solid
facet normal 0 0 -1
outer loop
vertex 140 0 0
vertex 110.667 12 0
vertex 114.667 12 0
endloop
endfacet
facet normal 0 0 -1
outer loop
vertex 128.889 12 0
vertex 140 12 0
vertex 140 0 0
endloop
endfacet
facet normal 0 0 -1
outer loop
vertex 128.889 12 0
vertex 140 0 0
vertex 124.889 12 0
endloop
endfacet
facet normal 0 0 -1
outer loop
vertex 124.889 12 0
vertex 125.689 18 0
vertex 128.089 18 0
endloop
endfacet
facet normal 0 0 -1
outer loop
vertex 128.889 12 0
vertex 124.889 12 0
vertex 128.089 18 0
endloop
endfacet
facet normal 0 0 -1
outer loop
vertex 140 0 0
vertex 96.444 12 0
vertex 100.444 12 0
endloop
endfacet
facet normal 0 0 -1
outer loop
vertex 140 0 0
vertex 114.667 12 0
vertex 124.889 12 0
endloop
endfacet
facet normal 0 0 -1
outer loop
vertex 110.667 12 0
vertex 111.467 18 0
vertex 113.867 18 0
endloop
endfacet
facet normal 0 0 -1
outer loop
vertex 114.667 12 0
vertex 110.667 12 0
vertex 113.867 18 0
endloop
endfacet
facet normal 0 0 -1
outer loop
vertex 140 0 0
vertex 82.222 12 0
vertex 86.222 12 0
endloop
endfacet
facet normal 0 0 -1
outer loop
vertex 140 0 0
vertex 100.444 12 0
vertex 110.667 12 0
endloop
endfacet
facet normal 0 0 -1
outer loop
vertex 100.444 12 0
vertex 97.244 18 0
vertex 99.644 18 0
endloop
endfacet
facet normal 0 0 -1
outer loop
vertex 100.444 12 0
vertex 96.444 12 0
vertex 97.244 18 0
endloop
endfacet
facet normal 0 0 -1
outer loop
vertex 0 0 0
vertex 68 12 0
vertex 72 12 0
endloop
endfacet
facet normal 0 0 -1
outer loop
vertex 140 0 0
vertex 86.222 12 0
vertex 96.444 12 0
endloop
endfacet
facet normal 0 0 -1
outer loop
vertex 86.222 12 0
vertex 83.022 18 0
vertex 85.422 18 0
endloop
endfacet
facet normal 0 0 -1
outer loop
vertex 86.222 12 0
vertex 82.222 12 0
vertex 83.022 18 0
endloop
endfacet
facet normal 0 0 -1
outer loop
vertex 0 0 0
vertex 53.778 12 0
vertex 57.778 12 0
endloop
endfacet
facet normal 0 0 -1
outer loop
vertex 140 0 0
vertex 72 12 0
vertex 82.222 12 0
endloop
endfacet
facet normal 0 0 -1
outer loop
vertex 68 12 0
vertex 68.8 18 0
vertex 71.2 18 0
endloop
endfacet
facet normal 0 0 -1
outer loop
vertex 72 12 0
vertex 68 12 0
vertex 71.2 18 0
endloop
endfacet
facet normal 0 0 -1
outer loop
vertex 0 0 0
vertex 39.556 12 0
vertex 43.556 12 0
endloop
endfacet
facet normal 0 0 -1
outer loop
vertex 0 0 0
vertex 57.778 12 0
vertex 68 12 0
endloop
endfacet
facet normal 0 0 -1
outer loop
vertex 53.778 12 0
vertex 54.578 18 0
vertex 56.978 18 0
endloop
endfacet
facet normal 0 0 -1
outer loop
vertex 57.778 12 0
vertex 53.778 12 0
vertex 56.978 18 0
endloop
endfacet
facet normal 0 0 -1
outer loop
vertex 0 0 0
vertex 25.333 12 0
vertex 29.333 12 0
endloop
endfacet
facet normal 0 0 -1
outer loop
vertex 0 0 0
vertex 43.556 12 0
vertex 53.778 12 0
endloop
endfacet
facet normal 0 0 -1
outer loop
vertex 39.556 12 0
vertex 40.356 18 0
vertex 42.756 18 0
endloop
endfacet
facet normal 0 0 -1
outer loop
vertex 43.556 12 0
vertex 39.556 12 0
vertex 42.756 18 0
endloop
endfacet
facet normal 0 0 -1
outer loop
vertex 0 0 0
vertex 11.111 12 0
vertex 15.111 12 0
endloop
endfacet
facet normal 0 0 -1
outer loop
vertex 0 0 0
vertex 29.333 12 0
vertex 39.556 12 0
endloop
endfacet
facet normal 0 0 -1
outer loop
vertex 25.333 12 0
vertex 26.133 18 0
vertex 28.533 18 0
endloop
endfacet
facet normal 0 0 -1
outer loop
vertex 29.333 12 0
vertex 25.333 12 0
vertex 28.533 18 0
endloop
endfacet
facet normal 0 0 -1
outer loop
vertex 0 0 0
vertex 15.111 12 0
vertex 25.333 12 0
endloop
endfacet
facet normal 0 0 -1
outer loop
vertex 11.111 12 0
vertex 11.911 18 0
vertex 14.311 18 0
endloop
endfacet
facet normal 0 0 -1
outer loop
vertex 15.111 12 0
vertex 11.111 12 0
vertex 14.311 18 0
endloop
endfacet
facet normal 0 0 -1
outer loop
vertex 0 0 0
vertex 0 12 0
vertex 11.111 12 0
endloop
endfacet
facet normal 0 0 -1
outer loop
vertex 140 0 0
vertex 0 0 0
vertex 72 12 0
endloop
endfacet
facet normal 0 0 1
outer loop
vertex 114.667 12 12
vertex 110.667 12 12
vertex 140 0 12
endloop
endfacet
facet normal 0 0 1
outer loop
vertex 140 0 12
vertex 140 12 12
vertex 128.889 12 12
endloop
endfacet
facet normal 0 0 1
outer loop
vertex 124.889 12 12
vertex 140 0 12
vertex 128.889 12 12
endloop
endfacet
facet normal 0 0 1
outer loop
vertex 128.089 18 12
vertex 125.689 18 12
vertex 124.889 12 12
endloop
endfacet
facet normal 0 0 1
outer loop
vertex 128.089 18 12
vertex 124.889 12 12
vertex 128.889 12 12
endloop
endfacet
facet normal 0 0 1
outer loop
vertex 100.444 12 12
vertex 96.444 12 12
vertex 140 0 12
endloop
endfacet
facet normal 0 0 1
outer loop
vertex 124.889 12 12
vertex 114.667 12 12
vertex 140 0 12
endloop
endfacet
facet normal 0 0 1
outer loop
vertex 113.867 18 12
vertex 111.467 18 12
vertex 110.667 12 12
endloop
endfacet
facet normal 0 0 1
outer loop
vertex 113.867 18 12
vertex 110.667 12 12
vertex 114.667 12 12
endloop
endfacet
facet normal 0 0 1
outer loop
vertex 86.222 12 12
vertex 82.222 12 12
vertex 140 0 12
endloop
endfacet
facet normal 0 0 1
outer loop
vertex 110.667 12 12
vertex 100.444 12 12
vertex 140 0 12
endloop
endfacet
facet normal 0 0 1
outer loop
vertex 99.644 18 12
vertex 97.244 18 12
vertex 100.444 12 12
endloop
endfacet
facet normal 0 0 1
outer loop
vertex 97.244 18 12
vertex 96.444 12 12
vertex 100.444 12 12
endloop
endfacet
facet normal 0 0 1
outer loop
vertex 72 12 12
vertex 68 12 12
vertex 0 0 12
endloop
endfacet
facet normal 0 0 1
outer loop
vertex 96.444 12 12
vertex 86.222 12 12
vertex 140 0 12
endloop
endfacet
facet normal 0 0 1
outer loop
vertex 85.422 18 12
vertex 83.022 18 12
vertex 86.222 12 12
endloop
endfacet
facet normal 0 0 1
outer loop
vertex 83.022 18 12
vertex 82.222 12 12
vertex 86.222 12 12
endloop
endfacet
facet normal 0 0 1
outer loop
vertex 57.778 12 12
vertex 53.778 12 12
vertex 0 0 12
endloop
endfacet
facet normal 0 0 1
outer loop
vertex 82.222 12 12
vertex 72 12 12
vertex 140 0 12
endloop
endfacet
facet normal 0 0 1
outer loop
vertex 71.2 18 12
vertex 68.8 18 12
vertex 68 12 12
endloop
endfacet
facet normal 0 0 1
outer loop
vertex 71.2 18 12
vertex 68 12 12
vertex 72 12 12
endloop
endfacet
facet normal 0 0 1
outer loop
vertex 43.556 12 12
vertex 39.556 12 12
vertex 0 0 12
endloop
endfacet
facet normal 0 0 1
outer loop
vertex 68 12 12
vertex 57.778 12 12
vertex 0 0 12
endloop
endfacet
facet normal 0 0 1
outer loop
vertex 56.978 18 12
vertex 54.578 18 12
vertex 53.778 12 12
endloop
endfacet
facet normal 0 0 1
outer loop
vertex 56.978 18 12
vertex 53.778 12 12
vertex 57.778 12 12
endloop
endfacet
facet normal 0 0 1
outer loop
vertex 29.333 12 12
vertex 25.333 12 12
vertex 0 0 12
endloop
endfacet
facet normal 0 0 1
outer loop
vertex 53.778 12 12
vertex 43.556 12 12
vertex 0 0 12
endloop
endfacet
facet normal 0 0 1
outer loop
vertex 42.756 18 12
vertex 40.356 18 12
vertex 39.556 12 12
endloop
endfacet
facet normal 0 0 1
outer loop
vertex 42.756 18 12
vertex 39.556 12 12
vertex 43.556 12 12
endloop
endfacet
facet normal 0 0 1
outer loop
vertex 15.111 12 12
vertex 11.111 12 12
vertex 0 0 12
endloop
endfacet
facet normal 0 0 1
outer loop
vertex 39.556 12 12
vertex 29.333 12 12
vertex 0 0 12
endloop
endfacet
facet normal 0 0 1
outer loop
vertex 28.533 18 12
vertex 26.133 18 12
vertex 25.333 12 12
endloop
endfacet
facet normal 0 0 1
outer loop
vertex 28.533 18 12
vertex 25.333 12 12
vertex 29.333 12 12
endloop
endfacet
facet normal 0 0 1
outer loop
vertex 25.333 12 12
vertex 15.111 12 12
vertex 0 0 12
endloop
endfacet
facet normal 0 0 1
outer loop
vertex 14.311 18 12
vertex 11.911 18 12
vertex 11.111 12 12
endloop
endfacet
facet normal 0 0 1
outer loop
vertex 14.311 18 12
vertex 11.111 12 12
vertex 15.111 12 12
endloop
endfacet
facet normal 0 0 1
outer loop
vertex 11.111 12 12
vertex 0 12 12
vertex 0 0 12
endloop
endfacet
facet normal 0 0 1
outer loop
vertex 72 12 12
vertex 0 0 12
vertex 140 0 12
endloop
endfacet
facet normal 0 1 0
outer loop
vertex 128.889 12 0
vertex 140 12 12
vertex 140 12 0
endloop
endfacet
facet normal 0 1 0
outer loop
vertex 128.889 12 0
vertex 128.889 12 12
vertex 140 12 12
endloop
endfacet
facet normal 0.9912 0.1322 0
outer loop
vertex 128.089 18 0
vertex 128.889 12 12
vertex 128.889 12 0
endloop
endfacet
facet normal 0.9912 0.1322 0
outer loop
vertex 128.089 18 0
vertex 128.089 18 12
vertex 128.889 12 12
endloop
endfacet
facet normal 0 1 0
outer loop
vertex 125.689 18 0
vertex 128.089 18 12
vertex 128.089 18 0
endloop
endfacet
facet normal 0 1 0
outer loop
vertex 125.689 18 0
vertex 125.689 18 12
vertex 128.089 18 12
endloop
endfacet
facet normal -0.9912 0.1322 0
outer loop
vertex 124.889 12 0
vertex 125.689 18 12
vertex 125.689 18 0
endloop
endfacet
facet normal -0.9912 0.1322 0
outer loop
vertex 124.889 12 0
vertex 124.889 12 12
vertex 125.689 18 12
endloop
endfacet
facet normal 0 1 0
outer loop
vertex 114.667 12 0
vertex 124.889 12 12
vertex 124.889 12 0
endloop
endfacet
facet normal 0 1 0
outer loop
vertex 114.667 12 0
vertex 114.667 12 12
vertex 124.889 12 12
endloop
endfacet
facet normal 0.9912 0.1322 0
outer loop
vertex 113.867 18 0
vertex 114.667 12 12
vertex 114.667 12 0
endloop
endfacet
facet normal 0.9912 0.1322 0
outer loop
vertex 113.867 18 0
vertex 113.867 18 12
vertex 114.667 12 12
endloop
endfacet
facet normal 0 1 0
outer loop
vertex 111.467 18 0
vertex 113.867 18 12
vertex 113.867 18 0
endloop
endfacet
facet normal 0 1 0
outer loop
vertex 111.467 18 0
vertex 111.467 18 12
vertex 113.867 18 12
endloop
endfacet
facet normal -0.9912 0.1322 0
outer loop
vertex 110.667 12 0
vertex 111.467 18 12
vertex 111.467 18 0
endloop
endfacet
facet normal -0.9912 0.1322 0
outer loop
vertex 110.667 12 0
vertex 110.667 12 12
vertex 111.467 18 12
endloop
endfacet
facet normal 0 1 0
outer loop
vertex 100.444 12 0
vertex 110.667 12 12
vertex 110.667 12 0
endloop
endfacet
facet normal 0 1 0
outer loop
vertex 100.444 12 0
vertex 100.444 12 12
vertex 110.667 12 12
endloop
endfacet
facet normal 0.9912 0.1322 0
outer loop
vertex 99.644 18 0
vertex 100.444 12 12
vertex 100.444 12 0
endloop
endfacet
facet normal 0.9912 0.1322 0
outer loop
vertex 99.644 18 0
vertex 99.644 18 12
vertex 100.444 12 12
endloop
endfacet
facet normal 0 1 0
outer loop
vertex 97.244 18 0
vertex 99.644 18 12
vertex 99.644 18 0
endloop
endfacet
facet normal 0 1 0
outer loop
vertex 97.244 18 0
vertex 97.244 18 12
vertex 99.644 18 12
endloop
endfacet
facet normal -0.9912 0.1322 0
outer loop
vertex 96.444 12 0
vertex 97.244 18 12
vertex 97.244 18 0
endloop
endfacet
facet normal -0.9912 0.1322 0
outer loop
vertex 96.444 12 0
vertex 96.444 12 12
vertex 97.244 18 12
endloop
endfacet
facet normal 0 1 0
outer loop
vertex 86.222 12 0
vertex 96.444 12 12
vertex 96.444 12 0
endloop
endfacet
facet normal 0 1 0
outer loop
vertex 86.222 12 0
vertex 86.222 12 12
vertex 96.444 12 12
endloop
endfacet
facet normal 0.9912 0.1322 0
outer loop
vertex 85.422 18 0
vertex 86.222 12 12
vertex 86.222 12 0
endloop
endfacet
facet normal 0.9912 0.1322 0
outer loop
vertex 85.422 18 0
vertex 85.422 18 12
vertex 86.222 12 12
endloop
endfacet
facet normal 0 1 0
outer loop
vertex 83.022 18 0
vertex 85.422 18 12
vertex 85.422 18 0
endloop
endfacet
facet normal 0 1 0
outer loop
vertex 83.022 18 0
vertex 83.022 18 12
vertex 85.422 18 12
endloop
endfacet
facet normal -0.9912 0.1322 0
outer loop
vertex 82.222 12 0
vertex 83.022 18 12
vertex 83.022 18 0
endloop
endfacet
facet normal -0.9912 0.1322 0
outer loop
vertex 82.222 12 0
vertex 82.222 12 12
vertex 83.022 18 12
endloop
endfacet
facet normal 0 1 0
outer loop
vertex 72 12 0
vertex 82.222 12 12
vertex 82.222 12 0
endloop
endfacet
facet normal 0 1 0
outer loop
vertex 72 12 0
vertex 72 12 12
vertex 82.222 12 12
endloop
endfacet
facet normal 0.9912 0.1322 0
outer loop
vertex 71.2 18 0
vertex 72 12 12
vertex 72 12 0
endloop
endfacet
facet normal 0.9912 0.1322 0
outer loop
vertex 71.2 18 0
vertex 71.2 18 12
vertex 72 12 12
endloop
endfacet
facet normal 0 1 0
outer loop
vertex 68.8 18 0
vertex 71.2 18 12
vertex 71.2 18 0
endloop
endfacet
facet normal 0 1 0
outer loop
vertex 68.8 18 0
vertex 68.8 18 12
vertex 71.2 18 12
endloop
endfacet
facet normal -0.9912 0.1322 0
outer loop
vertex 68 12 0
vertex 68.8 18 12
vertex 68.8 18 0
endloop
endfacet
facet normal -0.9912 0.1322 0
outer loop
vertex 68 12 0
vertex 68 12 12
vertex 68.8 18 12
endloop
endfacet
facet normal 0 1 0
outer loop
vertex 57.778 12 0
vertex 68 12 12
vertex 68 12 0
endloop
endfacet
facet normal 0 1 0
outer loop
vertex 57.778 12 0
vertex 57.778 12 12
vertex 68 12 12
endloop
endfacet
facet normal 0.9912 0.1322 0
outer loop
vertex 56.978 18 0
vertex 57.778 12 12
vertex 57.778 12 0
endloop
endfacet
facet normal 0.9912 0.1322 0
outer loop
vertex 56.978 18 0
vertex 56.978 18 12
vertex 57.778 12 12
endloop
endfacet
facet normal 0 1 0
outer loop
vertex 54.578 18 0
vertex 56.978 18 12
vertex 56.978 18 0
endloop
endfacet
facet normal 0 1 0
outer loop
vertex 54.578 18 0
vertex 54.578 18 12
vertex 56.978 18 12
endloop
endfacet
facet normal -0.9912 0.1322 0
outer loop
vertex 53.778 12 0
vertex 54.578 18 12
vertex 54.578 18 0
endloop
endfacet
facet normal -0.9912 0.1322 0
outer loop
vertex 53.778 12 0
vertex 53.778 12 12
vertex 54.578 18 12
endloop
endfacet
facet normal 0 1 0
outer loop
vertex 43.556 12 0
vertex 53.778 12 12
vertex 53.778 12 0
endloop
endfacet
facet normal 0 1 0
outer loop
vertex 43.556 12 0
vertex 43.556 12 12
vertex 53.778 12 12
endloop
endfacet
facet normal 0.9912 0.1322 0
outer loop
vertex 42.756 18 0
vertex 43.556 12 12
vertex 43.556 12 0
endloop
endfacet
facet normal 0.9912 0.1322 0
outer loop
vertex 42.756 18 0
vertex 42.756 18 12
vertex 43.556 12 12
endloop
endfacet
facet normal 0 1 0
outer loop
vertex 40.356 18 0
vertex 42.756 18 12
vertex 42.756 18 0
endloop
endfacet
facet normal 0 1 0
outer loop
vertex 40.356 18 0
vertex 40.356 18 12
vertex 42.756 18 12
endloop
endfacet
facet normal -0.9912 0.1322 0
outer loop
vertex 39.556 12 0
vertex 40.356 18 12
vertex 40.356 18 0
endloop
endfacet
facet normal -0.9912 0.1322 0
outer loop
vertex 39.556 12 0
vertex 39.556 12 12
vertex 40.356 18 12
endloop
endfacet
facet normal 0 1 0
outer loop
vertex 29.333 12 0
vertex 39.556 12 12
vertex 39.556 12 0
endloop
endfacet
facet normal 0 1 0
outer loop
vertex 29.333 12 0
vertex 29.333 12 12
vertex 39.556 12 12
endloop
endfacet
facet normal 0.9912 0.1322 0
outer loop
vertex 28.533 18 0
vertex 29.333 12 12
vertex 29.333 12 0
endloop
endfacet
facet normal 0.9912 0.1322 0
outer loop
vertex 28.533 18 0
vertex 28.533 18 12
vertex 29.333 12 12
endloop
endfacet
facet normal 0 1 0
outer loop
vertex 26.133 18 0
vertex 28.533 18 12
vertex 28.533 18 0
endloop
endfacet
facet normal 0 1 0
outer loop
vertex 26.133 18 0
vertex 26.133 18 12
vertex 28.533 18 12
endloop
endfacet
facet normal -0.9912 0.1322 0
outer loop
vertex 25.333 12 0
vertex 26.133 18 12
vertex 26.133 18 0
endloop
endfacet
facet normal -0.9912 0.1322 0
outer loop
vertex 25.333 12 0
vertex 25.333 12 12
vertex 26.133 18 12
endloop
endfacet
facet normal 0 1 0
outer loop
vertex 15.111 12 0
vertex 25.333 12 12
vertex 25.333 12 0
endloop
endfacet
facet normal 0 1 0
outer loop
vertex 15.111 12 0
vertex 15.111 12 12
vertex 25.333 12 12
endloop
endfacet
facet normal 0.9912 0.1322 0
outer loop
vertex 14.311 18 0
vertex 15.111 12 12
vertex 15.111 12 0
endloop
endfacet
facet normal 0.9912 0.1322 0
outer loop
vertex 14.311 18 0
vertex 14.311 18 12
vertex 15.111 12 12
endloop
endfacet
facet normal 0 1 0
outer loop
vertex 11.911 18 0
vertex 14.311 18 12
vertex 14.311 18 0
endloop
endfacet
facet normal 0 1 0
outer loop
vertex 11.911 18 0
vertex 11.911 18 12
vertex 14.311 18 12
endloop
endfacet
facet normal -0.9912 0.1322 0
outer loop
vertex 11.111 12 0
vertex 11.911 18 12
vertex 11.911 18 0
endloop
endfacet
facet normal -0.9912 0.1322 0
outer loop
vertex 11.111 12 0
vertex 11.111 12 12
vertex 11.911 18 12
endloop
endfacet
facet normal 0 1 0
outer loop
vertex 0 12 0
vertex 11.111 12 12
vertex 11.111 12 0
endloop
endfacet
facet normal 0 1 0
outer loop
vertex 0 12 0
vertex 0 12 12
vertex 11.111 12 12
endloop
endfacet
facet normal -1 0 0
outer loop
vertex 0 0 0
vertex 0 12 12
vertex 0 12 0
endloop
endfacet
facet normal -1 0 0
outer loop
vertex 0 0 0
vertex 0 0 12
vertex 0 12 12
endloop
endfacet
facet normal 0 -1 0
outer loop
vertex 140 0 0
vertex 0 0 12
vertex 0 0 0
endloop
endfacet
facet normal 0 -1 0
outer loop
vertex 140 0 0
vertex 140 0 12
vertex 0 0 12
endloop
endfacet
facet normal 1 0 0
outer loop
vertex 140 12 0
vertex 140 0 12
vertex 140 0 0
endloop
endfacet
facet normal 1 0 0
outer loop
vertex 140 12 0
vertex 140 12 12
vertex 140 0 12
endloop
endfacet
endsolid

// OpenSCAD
$fn = 32;

// ----------------------------------------------------------------------
// Gear rack: 9 teeth on a 140 mm bar, pitch 14.22 mm
// ----------------------------------------------------------------------

// --- parameters (mm) ---
profile_height = 12;      // extrusion height
profile_points = 40;      // points of the closed outline

profile = [[0, 0], [140, 0], [140, 12], [128.889, 12], [128.089, 18], [125.689, 18], [124.889, 12], [114.667, 12], [113.867, 18], [111.467, 18], [110.667, 12], [100.444, 12], [99.644, 18], [97.244, 18], [96.444, 12], [86.222, 12], [85.422, 18], [83.022, 18], [82.222, 12], [72, 12], [71.2, 18], [68.8, 18], [68, 12], [57.778, 12], [56.978, 18], [54.578, 18], [53.778, 12], [43.556, 12], [42.756, 18], [40.356, 18], [39.556, 12], [29.333, 12], [28.533, 18], [26.133, 18], [25.333, 12], [15.111, 12], [14.311, 18], [11.911, 18], [11.111, 12], [0, 12]];  // single closed polygon, 40 points, counter clockwise

// --- the one profile operation ---
linear_extrude(height = profile_height) polygon(points = profile);
